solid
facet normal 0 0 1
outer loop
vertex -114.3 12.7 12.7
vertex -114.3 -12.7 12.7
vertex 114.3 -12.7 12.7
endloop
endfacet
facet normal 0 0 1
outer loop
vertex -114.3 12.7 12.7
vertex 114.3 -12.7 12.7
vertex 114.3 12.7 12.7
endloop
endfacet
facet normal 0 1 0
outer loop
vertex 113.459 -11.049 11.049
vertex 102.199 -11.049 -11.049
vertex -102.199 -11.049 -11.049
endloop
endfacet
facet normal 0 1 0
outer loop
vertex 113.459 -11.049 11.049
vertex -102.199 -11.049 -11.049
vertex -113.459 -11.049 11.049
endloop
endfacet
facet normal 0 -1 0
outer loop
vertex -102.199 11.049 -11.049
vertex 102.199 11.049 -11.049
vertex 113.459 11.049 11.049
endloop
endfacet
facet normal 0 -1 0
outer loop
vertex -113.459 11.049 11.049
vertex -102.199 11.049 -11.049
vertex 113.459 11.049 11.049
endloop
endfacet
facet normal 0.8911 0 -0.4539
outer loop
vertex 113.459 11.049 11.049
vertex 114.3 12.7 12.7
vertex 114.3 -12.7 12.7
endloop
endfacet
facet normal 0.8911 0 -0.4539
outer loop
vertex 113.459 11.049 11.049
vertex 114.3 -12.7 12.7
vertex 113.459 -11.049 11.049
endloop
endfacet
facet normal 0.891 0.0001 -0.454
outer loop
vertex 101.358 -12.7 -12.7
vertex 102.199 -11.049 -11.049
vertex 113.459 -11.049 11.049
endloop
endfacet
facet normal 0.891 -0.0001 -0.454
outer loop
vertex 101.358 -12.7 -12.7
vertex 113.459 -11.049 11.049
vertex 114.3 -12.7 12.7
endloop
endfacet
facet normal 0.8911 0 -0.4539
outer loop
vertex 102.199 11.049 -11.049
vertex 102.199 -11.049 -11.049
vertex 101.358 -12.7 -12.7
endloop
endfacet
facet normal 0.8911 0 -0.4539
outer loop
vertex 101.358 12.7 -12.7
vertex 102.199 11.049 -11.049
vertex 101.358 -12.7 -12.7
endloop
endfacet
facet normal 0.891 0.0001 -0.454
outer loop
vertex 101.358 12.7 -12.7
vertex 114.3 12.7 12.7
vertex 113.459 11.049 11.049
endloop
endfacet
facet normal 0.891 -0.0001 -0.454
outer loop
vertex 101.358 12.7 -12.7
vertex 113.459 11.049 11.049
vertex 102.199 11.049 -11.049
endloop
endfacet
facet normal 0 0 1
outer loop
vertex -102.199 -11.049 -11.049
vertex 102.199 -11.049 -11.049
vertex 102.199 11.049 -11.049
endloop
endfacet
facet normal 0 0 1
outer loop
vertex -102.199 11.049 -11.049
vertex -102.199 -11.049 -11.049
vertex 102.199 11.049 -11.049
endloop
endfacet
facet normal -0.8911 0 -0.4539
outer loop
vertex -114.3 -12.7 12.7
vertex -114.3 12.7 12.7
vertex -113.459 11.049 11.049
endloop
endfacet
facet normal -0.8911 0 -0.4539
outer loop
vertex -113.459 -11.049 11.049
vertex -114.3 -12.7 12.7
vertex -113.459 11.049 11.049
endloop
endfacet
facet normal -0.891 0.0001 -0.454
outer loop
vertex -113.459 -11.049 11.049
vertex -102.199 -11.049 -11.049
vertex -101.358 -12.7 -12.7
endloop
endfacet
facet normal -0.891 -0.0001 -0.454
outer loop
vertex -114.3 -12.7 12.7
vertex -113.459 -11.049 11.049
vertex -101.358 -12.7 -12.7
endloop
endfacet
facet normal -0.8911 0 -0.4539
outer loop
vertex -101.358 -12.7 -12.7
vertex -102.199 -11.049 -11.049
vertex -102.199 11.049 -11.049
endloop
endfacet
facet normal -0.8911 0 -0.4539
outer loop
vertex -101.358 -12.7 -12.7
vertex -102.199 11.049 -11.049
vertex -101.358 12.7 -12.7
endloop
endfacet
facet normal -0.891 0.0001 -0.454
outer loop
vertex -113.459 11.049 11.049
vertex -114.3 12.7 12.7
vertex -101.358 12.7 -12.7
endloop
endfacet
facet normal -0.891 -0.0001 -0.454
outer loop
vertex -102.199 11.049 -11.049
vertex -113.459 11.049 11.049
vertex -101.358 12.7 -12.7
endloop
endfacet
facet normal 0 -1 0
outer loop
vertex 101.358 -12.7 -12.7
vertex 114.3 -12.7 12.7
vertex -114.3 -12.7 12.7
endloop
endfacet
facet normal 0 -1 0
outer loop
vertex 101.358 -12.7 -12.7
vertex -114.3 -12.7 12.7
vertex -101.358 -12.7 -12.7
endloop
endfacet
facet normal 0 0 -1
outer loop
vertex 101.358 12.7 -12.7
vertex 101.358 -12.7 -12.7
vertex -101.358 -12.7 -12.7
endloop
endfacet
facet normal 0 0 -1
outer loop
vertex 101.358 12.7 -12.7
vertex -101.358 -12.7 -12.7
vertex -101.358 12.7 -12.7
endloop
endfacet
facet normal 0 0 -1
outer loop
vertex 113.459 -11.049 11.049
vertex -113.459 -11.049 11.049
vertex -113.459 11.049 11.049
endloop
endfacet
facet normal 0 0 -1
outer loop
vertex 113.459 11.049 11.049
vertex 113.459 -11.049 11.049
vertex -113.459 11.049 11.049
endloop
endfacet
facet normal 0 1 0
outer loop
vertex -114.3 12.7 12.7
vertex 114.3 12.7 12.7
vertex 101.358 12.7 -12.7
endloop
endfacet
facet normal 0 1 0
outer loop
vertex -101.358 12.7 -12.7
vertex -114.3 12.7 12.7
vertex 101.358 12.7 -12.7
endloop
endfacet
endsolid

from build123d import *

# Parameters (mm, degrees)
SKETCH1_W           = 25.4
SKETCH1_H           = 25.4
BOSS_EXTRUDE1_DEPTH = 114.3
CUT_EXTRUDE1_DEPTH  = 685.8
SKETCH5_W           = 22.098
SKETCH5_H           = 22.098
CUT_EXTRUDE3_DEPTH  = 230.304470083
CUT_EXTRUDE4_DEPTH  = 685.8


with BuildPart() as part:
    # Sketch1 → Boss-Extrude1 (new, symmetric)
    with BuildSketch(Plane(origin=(0, 0, 0), x_dir=(0, 0, -1), z_dir=(1, 0, 0))):
        Rectangle(SKETCH1_W, SKETCH1_H)
    extrude(amount=BOSS_EXTRUDE1_DEPTH, both=True)

    # Sketch2 → Cut-Extrude1 (cut)
    with BuildSketch(Plane(origin=(0, 12.7, 0), x_dir=(1, 0, 0), z_dir=(0, 1, 0))):
        Polygon((114.3, -12.7), (101.358053583, 12.7), (114.3, 12.7), align=None)
    extrude(amount=-CUT_EXTRUDE1_DEPTH, mode=Mode.SUBTRACT)

    # Sketch5 → Cut-Extrude3 (cut, through all)
    with BuildSketch(Plane.ZY.offset(114.3)):
        Rectangle(SKETCH5_W, SKETCH5_H)
    extrude(amount=-CUT_EXTRUDE3_DEPTH, mode=Mode.SUBTRACT)

    # Sketch6 → Cut-Extrude4 (cut)
    with BuildSketch(Plane(origin=(0, 12.7, 0), x_dir=(1, 0, 0), z_dir=(0, 1, 0))):
        Polygon((-114.3, -12.7), (-101.358053583, 12.7), (-114.3, 12.7), align=None)
    extrude(amount=-CUT_EXTRUDE4_DEPTH, mode=Mode.SUBTRACT)


solid = part.part
